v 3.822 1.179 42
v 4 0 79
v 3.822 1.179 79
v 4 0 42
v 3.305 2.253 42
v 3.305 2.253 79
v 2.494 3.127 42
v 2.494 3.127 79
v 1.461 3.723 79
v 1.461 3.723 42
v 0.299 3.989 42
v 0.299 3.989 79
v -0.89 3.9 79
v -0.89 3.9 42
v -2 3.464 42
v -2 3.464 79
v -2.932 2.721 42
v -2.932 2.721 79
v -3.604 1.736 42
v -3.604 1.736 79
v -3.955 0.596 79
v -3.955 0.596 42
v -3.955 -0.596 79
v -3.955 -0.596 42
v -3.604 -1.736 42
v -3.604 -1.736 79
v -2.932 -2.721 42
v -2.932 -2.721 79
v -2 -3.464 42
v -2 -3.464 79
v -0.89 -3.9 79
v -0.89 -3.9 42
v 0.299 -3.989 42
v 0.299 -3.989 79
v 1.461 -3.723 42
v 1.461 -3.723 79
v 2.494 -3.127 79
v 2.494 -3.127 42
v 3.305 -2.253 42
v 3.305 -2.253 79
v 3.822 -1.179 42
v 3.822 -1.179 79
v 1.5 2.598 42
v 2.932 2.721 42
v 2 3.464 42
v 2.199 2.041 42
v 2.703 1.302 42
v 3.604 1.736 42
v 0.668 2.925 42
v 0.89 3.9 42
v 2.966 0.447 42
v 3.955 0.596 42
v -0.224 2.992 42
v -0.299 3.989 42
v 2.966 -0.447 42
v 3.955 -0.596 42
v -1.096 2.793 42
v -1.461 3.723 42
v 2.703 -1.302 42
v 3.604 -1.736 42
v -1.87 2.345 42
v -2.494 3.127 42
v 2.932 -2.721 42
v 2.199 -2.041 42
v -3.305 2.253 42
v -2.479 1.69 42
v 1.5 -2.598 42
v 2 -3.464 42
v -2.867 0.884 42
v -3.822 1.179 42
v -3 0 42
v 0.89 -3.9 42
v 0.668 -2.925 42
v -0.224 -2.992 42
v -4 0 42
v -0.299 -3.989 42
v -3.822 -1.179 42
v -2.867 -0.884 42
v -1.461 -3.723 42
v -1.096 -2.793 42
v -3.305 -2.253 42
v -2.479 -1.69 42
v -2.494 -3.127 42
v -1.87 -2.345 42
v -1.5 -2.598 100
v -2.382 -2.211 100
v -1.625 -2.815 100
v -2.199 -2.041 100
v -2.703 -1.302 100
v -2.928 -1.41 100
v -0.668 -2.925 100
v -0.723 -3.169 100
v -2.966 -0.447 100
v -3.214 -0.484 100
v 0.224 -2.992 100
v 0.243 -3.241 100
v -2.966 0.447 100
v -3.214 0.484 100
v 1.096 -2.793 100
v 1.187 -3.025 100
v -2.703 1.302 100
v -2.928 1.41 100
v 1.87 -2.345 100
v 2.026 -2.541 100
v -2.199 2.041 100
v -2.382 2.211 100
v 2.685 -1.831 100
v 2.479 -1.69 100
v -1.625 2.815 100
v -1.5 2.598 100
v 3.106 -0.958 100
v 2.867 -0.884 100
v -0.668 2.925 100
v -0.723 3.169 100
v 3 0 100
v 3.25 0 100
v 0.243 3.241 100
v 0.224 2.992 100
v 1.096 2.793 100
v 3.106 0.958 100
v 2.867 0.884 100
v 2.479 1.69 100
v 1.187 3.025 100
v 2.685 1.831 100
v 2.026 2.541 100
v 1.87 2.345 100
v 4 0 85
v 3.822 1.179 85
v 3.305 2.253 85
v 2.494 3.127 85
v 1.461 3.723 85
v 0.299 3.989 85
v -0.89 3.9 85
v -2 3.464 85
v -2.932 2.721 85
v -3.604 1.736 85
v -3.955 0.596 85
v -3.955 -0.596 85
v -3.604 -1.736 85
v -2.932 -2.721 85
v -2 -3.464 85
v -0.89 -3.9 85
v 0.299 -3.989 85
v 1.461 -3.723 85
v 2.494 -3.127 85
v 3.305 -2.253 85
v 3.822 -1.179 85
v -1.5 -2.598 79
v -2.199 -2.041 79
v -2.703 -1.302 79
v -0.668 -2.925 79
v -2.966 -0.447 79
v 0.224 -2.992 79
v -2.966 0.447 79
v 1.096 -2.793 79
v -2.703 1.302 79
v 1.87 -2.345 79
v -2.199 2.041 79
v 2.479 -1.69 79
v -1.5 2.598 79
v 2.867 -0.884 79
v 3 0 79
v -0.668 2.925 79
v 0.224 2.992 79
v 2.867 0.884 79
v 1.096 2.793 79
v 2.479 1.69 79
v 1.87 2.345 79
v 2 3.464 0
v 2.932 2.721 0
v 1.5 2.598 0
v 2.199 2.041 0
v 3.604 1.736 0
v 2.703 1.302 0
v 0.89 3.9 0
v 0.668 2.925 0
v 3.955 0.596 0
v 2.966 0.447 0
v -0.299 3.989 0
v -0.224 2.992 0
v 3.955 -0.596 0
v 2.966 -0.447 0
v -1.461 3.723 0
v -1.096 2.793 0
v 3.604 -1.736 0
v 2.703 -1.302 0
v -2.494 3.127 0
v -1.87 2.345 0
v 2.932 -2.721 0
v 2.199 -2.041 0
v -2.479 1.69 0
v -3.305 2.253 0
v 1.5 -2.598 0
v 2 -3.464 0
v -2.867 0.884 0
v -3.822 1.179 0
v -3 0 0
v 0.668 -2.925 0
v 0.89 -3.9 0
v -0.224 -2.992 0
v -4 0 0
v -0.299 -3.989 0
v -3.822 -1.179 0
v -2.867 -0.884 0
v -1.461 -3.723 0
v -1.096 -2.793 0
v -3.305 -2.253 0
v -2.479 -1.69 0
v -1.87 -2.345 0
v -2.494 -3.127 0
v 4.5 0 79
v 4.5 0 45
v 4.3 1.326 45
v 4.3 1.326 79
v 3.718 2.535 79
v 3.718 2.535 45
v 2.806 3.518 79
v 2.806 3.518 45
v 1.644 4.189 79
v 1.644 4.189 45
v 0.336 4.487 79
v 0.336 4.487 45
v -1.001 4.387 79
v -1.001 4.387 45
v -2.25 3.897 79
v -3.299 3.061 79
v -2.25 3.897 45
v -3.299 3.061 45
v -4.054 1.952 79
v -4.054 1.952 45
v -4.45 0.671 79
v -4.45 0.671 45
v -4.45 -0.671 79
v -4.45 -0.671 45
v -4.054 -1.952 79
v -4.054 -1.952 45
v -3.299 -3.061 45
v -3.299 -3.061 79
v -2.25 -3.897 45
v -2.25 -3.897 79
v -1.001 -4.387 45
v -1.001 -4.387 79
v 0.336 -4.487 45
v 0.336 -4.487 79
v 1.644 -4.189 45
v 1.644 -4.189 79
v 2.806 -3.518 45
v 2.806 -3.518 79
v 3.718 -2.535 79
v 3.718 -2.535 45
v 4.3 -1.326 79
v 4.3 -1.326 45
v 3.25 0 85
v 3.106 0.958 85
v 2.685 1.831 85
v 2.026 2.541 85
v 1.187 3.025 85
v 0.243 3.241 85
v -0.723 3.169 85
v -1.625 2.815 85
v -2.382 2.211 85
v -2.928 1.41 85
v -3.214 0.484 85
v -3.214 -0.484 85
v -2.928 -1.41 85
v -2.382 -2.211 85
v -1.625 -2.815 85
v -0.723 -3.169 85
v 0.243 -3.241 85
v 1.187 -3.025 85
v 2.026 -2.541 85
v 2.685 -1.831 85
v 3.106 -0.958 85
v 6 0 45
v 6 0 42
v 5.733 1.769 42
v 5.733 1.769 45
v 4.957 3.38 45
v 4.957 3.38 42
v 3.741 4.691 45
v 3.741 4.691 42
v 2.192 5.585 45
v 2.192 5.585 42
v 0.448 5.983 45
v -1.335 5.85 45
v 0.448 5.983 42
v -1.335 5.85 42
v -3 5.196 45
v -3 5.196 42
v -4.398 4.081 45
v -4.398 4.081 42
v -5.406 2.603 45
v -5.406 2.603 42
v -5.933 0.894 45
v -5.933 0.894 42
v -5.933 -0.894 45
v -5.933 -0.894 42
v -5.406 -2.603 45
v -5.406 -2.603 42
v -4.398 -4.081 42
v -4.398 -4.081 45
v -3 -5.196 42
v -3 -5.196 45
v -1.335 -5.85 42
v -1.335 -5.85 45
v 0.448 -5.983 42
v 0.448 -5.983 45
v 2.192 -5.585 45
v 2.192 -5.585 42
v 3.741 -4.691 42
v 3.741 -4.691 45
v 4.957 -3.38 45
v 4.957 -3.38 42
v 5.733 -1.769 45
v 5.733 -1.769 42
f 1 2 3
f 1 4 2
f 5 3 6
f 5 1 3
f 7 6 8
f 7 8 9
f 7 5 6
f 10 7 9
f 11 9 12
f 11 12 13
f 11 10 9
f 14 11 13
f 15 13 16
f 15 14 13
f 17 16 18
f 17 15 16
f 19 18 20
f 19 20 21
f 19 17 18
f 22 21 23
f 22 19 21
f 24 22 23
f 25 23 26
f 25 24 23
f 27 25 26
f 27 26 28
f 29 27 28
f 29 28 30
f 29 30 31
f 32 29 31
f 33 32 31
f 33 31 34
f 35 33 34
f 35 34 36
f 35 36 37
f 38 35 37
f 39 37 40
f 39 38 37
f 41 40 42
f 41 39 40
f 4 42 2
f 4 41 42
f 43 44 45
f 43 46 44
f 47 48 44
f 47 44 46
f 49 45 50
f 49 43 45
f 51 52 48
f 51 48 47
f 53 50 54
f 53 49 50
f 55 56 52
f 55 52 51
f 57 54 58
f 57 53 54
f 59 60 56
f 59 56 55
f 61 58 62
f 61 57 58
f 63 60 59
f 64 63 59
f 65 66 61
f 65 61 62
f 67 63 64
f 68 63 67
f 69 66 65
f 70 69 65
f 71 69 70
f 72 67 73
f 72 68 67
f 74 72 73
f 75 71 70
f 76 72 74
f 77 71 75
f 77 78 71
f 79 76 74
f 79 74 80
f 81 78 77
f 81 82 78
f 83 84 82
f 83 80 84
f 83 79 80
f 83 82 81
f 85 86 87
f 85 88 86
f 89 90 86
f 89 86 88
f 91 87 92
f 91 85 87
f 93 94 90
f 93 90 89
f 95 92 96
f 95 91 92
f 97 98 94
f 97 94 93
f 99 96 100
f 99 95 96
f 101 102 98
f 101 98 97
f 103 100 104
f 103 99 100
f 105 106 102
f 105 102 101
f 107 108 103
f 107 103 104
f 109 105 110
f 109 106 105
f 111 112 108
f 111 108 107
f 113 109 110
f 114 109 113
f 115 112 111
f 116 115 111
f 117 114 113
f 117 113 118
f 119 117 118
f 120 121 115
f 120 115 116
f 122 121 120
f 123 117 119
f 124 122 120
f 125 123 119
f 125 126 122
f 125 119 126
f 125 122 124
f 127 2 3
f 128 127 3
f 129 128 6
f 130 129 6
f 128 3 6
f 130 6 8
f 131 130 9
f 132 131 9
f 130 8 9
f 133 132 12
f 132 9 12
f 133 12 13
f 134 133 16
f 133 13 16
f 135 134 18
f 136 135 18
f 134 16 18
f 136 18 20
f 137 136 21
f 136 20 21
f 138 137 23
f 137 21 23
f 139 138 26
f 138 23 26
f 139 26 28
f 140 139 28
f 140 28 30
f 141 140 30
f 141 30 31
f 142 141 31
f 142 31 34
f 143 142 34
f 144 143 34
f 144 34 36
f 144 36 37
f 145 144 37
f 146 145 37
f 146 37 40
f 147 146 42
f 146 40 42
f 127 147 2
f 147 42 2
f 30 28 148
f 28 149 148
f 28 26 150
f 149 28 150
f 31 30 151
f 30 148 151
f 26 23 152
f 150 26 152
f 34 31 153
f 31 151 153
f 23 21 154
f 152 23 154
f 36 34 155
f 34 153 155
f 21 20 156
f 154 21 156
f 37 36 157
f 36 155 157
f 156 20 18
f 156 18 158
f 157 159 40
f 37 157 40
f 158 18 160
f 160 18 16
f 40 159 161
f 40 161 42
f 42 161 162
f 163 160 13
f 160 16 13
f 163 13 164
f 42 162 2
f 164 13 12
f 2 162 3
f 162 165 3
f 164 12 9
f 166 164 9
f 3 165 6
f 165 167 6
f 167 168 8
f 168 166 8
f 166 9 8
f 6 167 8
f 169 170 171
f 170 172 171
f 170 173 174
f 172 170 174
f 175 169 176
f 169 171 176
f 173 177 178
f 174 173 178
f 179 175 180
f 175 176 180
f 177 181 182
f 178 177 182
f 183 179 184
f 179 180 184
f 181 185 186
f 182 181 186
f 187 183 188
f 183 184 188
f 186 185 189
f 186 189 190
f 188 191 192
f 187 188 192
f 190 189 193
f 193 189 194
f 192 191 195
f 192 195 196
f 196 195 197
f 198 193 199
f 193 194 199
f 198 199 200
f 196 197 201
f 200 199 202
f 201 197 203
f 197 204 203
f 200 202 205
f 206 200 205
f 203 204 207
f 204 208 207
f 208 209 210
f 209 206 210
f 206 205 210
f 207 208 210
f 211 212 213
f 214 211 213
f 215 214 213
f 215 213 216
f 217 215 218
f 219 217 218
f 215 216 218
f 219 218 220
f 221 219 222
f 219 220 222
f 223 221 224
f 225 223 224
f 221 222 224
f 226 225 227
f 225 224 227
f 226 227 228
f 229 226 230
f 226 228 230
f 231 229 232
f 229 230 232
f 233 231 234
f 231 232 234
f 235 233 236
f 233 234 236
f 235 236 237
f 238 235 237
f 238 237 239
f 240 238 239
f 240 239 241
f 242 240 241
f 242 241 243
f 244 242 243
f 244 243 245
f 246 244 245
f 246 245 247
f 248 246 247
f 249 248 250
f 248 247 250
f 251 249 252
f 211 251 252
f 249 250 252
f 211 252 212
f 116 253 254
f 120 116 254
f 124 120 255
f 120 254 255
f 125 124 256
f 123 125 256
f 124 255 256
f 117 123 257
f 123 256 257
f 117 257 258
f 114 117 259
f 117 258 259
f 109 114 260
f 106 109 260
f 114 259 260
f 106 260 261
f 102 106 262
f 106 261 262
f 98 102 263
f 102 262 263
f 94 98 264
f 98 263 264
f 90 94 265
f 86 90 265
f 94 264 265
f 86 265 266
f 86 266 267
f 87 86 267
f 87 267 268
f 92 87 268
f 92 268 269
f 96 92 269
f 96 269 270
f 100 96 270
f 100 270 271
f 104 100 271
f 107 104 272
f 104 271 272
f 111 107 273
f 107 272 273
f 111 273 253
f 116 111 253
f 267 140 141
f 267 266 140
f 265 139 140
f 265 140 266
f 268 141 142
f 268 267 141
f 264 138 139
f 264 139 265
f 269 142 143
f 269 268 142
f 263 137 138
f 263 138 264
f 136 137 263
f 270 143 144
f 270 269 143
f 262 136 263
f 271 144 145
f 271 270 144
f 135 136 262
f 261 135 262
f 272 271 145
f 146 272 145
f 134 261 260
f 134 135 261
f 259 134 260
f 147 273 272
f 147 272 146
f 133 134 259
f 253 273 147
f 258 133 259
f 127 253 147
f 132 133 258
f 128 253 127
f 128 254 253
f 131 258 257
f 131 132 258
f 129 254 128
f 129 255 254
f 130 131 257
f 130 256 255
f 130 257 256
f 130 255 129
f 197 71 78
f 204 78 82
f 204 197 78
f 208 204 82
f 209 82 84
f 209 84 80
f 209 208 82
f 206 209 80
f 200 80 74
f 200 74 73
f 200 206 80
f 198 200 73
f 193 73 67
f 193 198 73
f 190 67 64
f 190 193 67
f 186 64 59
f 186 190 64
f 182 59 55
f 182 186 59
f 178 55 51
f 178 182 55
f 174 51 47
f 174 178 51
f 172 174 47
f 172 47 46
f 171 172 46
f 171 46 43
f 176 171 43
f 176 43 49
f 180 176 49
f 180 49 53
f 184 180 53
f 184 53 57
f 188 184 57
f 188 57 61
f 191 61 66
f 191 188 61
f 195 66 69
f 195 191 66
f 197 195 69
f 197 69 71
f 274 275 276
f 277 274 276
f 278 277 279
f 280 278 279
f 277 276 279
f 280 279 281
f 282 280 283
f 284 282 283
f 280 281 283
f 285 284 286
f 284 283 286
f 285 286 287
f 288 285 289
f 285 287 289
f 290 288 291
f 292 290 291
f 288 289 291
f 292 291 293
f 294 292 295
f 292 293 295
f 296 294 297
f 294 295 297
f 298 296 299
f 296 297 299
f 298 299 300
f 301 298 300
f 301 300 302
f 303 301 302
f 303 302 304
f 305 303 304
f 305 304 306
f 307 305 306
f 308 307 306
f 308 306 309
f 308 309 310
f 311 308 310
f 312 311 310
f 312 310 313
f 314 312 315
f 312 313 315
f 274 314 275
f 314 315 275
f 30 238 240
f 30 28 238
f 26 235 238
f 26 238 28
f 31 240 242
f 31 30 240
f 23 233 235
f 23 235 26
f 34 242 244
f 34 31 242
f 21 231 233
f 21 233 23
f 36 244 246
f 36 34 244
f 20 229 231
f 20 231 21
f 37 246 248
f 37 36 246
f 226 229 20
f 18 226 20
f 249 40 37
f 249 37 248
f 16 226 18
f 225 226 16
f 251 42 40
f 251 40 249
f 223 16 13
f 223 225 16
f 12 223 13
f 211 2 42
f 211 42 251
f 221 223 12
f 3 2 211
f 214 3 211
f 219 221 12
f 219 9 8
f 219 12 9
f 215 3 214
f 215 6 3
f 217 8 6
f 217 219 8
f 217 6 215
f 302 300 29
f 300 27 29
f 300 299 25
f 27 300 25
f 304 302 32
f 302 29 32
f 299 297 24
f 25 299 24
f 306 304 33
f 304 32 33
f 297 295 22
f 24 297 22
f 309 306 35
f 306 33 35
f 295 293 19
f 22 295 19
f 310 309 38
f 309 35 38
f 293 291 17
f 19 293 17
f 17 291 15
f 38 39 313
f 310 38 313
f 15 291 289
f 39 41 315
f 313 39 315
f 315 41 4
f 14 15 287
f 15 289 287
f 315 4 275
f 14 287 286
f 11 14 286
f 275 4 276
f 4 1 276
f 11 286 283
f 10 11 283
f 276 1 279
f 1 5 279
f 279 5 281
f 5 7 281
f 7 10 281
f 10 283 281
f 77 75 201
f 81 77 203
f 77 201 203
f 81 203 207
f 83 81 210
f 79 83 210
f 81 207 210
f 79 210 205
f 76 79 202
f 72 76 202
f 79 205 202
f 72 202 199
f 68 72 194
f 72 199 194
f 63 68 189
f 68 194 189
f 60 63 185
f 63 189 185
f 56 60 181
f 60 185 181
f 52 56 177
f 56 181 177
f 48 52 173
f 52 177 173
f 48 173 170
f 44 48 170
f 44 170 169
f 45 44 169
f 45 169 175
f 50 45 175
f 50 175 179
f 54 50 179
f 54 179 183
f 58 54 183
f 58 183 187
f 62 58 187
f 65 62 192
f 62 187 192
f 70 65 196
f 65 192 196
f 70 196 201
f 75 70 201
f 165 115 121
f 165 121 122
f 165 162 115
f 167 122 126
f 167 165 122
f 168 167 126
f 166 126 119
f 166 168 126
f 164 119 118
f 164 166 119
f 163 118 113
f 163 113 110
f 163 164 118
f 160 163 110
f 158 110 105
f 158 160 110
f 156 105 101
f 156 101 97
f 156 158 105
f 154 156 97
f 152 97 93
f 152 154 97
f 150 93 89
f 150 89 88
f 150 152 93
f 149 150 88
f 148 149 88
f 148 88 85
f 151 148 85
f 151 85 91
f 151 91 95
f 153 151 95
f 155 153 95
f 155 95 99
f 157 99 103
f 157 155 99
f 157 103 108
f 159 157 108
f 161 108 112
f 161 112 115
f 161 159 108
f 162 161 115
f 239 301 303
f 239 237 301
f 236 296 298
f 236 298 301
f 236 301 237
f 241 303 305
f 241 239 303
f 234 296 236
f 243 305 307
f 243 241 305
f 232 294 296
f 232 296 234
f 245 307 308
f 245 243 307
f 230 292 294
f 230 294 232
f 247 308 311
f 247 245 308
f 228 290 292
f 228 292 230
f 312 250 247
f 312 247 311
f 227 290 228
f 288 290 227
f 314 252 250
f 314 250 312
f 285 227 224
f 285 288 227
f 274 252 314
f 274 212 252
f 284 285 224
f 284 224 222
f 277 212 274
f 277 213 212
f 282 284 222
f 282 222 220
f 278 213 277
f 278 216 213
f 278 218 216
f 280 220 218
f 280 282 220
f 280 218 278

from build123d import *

# Parameters (mm, degrees)
SKETCH2_R           = 4
SKETCH2_R_2         = 3
BOSS_EXTRUDE1_DEPTH = 42
SKETCH3_R           = 6
SKETCH3_R_2         = 4
BOSS_EXTRUDE2_DEPTH = 3
SKETCH4_R           = 4.5
SKETCH4_R_2         = 4
BOSS_EXTRUDE3_DEPTH = 34
SKETCH5_R           = 4
SKETCH5_R_2         = 3
BOSS_EXTRUDE4_DEPTH = 6
SKETCH6_R           = 3.25
SKETCH6_R_2         = 3
BOSS_EXTRUDE5_DEPTH = 15


with BuildPart() as part:
    # Sketch2 → Boss-Extrude1 (new body)
    with BuildSketch(Plane.XY):
        with Locations(Location((0, 0, 0), (0, 0, 180))):
            Circle(SKETCH2_R)
        with Locations(Location((0, 0, 0), (0, 0, 180))):
            Circle(SKETCH2_R_2, mode=Mode.SUBTRACT)
    extrude(amount=BOSS_EXTRUDE1_DEPTH)


with BuildPart() as body_2:
    # Sketch3 → Boss-Extrude2 (new body)
    with BuildSketch(Plane.XY.offset(42)):
        Circle(SKETCH3_R)
        Circle(SKETCH3_R_2, mode=Mode.SUBTRACT)
    extrude(amount=BOSS_EXTRUDE2_DEPTH)

    # Sketch4 → Boss-Extrude3 (add)
    with BuildSketch(Plane.XY.offset(45)):
        Circle(SKETCH4_R)
        Circle(SKETCH4_R_2, mode=Mode.SUBTRACT)
    extrude(amount=BOSS_EXTRUDE3_DEPTH)


with BuildPart() as body_3:
    # Sketch5 → Boss-Extrude4 (new body)
    with BuildSketch(Plane.XY.offset(79)):
        Circle(SKETCH5_R)
        Circle(SKETCH5_R_2, mode=Mode.SUBTRACT)
    extrude(amount=BOSS_EXTRUDE4_DEPTH)

    # Sketch6 → Boss-Extrude5 (add)
    with BuildSketch(Plane.XY.offset(85)):
        Circle(SKETCH6_R)
        Circle(SKETCH6_R_2, mode=Mode.SUBTRACT)
    extrude(amount=BOSS_EXTRUDE5_DEPTH)


solid = Compound([part.part, body_2.part, body_3.part])
